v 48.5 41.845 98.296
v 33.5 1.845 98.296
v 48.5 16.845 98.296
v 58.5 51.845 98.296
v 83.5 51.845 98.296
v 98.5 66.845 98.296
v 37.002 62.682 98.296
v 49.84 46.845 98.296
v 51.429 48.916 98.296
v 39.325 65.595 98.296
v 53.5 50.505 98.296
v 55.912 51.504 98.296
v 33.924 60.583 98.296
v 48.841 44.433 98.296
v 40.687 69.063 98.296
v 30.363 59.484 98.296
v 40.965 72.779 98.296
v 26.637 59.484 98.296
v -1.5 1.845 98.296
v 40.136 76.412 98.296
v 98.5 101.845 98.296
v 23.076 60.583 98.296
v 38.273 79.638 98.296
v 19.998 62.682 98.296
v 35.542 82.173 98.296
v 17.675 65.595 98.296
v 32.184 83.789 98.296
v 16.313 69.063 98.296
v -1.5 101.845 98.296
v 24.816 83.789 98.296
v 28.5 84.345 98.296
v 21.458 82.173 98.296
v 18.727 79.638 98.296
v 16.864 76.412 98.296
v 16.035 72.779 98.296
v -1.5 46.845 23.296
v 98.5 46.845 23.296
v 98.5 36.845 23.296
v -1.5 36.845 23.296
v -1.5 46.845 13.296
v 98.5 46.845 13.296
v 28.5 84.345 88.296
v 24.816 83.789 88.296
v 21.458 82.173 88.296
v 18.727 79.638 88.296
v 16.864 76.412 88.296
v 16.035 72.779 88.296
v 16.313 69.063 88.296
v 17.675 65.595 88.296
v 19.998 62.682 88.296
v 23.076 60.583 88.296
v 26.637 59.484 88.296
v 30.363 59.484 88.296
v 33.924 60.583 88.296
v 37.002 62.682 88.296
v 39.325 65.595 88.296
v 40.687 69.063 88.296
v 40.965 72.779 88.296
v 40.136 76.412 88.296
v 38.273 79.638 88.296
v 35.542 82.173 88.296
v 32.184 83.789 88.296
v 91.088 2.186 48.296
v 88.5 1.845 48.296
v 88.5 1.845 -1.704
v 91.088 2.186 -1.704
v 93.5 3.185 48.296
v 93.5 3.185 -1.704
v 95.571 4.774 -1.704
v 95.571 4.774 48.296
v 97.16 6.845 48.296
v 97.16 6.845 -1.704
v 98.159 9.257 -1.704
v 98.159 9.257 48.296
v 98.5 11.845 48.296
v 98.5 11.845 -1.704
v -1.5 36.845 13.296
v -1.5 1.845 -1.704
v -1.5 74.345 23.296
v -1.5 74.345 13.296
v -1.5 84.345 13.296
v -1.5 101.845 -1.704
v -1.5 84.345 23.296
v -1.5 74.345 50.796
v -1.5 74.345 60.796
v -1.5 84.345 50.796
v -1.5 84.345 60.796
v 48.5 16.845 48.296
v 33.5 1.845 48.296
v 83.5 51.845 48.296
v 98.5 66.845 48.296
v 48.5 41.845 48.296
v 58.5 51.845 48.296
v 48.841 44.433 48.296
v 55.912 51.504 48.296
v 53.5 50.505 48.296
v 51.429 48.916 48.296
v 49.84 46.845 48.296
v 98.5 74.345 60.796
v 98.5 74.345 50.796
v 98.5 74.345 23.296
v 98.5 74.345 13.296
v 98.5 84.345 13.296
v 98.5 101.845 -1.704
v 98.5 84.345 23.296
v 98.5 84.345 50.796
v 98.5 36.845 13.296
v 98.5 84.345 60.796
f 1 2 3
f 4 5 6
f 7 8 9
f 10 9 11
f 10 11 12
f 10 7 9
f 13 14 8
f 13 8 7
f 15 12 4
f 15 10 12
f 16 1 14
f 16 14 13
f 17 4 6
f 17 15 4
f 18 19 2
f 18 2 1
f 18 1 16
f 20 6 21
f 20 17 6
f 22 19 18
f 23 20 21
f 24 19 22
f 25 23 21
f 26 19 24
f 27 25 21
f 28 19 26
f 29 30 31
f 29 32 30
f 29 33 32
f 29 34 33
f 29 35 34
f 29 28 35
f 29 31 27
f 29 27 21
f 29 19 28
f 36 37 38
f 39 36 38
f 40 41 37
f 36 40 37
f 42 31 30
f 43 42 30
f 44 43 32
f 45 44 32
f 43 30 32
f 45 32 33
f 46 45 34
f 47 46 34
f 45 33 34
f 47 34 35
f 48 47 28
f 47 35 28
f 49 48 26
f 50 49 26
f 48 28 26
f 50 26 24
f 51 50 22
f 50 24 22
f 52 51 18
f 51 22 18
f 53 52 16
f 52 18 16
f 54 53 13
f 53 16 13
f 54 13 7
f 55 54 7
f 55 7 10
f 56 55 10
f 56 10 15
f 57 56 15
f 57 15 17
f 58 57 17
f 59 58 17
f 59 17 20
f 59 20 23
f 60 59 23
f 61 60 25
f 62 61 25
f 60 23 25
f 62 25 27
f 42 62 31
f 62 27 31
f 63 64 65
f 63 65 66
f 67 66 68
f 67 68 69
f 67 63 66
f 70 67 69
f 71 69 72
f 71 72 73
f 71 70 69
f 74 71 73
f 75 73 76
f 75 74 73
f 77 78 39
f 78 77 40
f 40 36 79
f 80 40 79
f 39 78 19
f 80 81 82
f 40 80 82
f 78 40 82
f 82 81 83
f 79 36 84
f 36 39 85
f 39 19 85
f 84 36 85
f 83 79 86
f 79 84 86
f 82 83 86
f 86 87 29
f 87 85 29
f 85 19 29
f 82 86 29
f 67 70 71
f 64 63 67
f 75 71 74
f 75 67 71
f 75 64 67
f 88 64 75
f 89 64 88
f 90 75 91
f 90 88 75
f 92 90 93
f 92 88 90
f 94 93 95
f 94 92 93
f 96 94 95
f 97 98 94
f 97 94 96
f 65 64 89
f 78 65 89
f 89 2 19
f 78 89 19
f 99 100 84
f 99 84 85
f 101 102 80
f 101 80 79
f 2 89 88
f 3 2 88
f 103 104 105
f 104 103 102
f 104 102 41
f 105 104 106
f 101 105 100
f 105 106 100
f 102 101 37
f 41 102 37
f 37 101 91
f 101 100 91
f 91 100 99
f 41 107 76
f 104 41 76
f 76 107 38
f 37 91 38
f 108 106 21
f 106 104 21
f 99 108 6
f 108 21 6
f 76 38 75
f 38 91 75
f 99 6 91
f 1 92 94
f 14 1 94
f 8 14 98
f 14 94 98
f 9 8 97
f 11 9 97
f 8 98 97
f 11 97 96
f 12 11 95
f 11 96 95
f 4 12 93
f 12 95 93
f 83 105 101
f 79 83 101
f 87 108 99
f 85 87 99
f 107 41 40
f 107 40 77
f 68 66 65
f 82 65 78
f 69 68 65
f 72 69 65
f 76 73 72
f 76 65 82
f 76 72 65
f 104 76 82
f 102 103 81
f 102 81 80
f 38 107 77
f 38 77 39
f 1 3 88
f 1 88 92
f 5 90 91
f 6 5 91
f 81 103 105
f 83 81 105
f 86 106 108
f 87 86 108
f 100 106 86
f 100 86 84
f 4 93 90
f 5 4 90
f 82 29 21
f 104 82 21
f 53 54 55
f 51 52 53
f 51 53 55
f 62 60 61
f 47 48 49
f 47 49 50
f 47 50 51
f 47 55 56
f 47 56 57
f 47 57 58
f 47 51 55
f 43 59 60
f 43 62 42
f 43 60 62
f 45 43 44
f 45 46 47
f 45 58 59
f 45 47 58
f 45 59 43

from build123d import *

# Parameters (mm, degrees)
F1_DEPTH  = 50
F2_DEPTH  = 50
F3_R      = 12.5
F4_DEPTH  = 10
F5_DEPTH  = 10
F6_W      = 10
F6_H      = 10
F7_DEPTH  = 100
F8_DEPTH  = 100
F9_DEPTH  = 100
F11_ANGLE = 90


with BuildPart() as f1:
    # F0 (on Right) → F1 (new body)
    with BuildSketch(Plane.YZ):
        with BuildLine():
            Line((66.8447806998, -31.704402437), (66.8447806998, 68.295597563))
            Line((66.8447806998, 68.295597563), (-33.1552193002, 68.295597563))
            Line((-33.1552193002, 68.295597563), (-33.1552193002, 33.295597563))
            Line((-33.1552193002, 33.295597563), (-18.1553634487, 18.2957411159))
            Line((-18.1553634487, 18.2957411159), (6.8449245505, 18.2957411159))
            ThreePointArc((6.8449245505, 18.2957411159), (13.9159923623, 15.3668089278), (16.8449245505, 8.2957411159))
            Line((16.8449245505, 8.2957411159), (16.8449245505, -16.7045462877))
            Line((16.8449245505, -16.7045462877), (31.8447806998, -31.704402437))
            Line((31.8447806998, -31.704402437), (66.8447806998, -31.704402437))
        make_face()
    extrude(amount=F1_DEPTH)

    # F1_face (on face) + F0 (on Right) → F2 (join)
    with BuildSketch(Plane(origin=(0, 26.0207710076, 27.4715879225), x_dir=(0, 1, 0), z_dir=(-1, 0, 0))):
        with BuildLine():
            Line((40.8240096922, -40.8240096405), (40.8240096922, 59.1759903595))
            Line((40.8240096922, 59.1759903595), (5.8240096922, 59.1759903595))
            Line((5.8240096922, 59.1759903595), (-9.1758464571, 44.1761342102))
            Line((-9.1758464571, 44.1761342102), (-9.1758464571, 19.1758468066))
            ThreePointArc((-9.1758464571, 19.1758468066), (-12.1047786452, 12.1047789947), (-19.1758464571, 9.1758468066))
            Line((-19.1758464571, 9.1758468066), (-44.1761344563, 9.1758468066))
            Line((-44.1761344563, 9.1758468066), (-59.1759903078, -5.8240096405))
            Line((-59.1759903078, -5.8240096405), (-59.1759903078, -40.8240096405))
            Line((-59.1759903078, -40.8240096405), (40.8240096922, -40.8240096405))
        make_face()
    with BuildSketch(Plane.YZ):
        with BuildLine():
            Line((66.8447806998, -31.704402437), (66.8447806998, 68.295597563))
            Line((66.8447806998, 68.295597563), (-33.1552193002, 68.295597563))
            Line((-33.1552193002, 68.295597563), (-33.1552193002, 33.295597563))
            Line((-33.1552193002, 33.295597563), (-18.1553634487, 18.2957411159))
            Line((-18.1553634487, 18.2957411159), (6.8449245505, 18.2957411159))
            ThreePointArc((6.8449245505, 18.2957411159), (13.9159923623, 15.3668089278), (16.8449245505, 8.2957411159))
            Line((16.8449245505, 8.2957411159), (16.8449245505, -16.7045462877))
            Line((16.8449245505, -16.7045462877), (31.8447806998, -31.704402437))
            Line((31.8447806998, -31.704402437), (66.8447806998, -31.704402437))
        make_face()
        with BuildLine():
            Line((-18.1553634487, 18.2957411159), (-33.1552193002, 33.295597563))
            Line((-33.1552193002, 33.295597563), (-33.1552193002, -21.704402437))
            ThreePointArc((-33.1552193002, -21.704402437), (-30.2262871121, -28.7754702488), (-23.1552193002, -31.704402437))
            Line((-23.1552193002, -31.704402437), (31.8447806998, -31.704402437))
            Line((31.8447806998, -31.704402437), (16.8449245505, -16.7045462877))
            Line((16.8449245505, -16.7045462877), (16.8449245505, 8.2957411159))
            ThreePointArc((16.8449245505, 8.2957411159), (13.9159923623, 15.3668089278), (6.8449245505, 18.2957411159))
            Line((6.8449245505, 18.2957411159), (-18.1553634487, 18.2957411159))
        make_face()
    extrude(amount=F2_DEPTH, dir=(-1, 0, 0))

    # F3 (on face) → F4 (join)
    with BuildSketch(Plane.YZ.offset(50)):
        with Locations((36.8447806998, 38.295597563)):
            Circle(F3_R)
    extrude(amount=-F4_DEPTH)

    # F3 (on face) → F5 (cut)
    with BuildSketch(Plane.YZ.offset(50)):
        with Locations((36.8447806998, 38.295597563)):
            Circle(F3_R)
    extrude(amount=-F5_DEPTH, mode=Mode.SUBTRACT)

    # F6 (on face) → F7 (cut)
    with BuildSketch(Plane(origin=(0, 0, -31.704402437), x_dir=(1, 0, 0), z_dir=(0, 0, -1))):
        with Locations((-30, -6.8447806998)):
            Rectangle(F6_W, F6_H)
    extrude(amount=-F7_DEPTH, mode=Mode.SUBTRACT)

    # F6 (on face) → F8 (cut)
    with BuildSketch(Plane(origin=(0, 0, -31.704402437), x_dir=(1, 0, 0), z_dir=(0, 0, -1))):
        with Locations((7.5, -44.3447806998)):
            Rectangle(F6_W, F6_H)
    extrude(amount=-F8_DEPTH, mode=Mode.SUBTRACT)

    # F6 (on face) → F9 (cut)
    with BuildSketch(Plane(origin=(0, 0, -31.704402437), x_dir=(1, 0, 0), z_dir=(0, 0, -1))):
        with Locations((-30, -44.3447806998)):
            Rectangle(F6_W, F6_H)
    extrude(amount=-F9_DEPTH, mode=Mode.SUBTRACT)


with BuildPart() as f1_1:
    # F10: moved
    add(f1.part.moved(Location((25, 60, 0))))


with BuildPart() as f1_2:
    # F11: moved
    add(f1_1.part.rotate(Axis((-25, 76.8447806998, 68.295597563), (0, -1, 0)), F11_ANGLE))


with BuildPart() as f1_3:
    # F12: moved
    add(f1_2.part.moved(Location((25, -25, -70))))


with BuildPart() as f1_4:
    # F13: moved
    add(f1_3.part.moved(Location((-1.5, 0, 0))))


solid = f1_4.part
